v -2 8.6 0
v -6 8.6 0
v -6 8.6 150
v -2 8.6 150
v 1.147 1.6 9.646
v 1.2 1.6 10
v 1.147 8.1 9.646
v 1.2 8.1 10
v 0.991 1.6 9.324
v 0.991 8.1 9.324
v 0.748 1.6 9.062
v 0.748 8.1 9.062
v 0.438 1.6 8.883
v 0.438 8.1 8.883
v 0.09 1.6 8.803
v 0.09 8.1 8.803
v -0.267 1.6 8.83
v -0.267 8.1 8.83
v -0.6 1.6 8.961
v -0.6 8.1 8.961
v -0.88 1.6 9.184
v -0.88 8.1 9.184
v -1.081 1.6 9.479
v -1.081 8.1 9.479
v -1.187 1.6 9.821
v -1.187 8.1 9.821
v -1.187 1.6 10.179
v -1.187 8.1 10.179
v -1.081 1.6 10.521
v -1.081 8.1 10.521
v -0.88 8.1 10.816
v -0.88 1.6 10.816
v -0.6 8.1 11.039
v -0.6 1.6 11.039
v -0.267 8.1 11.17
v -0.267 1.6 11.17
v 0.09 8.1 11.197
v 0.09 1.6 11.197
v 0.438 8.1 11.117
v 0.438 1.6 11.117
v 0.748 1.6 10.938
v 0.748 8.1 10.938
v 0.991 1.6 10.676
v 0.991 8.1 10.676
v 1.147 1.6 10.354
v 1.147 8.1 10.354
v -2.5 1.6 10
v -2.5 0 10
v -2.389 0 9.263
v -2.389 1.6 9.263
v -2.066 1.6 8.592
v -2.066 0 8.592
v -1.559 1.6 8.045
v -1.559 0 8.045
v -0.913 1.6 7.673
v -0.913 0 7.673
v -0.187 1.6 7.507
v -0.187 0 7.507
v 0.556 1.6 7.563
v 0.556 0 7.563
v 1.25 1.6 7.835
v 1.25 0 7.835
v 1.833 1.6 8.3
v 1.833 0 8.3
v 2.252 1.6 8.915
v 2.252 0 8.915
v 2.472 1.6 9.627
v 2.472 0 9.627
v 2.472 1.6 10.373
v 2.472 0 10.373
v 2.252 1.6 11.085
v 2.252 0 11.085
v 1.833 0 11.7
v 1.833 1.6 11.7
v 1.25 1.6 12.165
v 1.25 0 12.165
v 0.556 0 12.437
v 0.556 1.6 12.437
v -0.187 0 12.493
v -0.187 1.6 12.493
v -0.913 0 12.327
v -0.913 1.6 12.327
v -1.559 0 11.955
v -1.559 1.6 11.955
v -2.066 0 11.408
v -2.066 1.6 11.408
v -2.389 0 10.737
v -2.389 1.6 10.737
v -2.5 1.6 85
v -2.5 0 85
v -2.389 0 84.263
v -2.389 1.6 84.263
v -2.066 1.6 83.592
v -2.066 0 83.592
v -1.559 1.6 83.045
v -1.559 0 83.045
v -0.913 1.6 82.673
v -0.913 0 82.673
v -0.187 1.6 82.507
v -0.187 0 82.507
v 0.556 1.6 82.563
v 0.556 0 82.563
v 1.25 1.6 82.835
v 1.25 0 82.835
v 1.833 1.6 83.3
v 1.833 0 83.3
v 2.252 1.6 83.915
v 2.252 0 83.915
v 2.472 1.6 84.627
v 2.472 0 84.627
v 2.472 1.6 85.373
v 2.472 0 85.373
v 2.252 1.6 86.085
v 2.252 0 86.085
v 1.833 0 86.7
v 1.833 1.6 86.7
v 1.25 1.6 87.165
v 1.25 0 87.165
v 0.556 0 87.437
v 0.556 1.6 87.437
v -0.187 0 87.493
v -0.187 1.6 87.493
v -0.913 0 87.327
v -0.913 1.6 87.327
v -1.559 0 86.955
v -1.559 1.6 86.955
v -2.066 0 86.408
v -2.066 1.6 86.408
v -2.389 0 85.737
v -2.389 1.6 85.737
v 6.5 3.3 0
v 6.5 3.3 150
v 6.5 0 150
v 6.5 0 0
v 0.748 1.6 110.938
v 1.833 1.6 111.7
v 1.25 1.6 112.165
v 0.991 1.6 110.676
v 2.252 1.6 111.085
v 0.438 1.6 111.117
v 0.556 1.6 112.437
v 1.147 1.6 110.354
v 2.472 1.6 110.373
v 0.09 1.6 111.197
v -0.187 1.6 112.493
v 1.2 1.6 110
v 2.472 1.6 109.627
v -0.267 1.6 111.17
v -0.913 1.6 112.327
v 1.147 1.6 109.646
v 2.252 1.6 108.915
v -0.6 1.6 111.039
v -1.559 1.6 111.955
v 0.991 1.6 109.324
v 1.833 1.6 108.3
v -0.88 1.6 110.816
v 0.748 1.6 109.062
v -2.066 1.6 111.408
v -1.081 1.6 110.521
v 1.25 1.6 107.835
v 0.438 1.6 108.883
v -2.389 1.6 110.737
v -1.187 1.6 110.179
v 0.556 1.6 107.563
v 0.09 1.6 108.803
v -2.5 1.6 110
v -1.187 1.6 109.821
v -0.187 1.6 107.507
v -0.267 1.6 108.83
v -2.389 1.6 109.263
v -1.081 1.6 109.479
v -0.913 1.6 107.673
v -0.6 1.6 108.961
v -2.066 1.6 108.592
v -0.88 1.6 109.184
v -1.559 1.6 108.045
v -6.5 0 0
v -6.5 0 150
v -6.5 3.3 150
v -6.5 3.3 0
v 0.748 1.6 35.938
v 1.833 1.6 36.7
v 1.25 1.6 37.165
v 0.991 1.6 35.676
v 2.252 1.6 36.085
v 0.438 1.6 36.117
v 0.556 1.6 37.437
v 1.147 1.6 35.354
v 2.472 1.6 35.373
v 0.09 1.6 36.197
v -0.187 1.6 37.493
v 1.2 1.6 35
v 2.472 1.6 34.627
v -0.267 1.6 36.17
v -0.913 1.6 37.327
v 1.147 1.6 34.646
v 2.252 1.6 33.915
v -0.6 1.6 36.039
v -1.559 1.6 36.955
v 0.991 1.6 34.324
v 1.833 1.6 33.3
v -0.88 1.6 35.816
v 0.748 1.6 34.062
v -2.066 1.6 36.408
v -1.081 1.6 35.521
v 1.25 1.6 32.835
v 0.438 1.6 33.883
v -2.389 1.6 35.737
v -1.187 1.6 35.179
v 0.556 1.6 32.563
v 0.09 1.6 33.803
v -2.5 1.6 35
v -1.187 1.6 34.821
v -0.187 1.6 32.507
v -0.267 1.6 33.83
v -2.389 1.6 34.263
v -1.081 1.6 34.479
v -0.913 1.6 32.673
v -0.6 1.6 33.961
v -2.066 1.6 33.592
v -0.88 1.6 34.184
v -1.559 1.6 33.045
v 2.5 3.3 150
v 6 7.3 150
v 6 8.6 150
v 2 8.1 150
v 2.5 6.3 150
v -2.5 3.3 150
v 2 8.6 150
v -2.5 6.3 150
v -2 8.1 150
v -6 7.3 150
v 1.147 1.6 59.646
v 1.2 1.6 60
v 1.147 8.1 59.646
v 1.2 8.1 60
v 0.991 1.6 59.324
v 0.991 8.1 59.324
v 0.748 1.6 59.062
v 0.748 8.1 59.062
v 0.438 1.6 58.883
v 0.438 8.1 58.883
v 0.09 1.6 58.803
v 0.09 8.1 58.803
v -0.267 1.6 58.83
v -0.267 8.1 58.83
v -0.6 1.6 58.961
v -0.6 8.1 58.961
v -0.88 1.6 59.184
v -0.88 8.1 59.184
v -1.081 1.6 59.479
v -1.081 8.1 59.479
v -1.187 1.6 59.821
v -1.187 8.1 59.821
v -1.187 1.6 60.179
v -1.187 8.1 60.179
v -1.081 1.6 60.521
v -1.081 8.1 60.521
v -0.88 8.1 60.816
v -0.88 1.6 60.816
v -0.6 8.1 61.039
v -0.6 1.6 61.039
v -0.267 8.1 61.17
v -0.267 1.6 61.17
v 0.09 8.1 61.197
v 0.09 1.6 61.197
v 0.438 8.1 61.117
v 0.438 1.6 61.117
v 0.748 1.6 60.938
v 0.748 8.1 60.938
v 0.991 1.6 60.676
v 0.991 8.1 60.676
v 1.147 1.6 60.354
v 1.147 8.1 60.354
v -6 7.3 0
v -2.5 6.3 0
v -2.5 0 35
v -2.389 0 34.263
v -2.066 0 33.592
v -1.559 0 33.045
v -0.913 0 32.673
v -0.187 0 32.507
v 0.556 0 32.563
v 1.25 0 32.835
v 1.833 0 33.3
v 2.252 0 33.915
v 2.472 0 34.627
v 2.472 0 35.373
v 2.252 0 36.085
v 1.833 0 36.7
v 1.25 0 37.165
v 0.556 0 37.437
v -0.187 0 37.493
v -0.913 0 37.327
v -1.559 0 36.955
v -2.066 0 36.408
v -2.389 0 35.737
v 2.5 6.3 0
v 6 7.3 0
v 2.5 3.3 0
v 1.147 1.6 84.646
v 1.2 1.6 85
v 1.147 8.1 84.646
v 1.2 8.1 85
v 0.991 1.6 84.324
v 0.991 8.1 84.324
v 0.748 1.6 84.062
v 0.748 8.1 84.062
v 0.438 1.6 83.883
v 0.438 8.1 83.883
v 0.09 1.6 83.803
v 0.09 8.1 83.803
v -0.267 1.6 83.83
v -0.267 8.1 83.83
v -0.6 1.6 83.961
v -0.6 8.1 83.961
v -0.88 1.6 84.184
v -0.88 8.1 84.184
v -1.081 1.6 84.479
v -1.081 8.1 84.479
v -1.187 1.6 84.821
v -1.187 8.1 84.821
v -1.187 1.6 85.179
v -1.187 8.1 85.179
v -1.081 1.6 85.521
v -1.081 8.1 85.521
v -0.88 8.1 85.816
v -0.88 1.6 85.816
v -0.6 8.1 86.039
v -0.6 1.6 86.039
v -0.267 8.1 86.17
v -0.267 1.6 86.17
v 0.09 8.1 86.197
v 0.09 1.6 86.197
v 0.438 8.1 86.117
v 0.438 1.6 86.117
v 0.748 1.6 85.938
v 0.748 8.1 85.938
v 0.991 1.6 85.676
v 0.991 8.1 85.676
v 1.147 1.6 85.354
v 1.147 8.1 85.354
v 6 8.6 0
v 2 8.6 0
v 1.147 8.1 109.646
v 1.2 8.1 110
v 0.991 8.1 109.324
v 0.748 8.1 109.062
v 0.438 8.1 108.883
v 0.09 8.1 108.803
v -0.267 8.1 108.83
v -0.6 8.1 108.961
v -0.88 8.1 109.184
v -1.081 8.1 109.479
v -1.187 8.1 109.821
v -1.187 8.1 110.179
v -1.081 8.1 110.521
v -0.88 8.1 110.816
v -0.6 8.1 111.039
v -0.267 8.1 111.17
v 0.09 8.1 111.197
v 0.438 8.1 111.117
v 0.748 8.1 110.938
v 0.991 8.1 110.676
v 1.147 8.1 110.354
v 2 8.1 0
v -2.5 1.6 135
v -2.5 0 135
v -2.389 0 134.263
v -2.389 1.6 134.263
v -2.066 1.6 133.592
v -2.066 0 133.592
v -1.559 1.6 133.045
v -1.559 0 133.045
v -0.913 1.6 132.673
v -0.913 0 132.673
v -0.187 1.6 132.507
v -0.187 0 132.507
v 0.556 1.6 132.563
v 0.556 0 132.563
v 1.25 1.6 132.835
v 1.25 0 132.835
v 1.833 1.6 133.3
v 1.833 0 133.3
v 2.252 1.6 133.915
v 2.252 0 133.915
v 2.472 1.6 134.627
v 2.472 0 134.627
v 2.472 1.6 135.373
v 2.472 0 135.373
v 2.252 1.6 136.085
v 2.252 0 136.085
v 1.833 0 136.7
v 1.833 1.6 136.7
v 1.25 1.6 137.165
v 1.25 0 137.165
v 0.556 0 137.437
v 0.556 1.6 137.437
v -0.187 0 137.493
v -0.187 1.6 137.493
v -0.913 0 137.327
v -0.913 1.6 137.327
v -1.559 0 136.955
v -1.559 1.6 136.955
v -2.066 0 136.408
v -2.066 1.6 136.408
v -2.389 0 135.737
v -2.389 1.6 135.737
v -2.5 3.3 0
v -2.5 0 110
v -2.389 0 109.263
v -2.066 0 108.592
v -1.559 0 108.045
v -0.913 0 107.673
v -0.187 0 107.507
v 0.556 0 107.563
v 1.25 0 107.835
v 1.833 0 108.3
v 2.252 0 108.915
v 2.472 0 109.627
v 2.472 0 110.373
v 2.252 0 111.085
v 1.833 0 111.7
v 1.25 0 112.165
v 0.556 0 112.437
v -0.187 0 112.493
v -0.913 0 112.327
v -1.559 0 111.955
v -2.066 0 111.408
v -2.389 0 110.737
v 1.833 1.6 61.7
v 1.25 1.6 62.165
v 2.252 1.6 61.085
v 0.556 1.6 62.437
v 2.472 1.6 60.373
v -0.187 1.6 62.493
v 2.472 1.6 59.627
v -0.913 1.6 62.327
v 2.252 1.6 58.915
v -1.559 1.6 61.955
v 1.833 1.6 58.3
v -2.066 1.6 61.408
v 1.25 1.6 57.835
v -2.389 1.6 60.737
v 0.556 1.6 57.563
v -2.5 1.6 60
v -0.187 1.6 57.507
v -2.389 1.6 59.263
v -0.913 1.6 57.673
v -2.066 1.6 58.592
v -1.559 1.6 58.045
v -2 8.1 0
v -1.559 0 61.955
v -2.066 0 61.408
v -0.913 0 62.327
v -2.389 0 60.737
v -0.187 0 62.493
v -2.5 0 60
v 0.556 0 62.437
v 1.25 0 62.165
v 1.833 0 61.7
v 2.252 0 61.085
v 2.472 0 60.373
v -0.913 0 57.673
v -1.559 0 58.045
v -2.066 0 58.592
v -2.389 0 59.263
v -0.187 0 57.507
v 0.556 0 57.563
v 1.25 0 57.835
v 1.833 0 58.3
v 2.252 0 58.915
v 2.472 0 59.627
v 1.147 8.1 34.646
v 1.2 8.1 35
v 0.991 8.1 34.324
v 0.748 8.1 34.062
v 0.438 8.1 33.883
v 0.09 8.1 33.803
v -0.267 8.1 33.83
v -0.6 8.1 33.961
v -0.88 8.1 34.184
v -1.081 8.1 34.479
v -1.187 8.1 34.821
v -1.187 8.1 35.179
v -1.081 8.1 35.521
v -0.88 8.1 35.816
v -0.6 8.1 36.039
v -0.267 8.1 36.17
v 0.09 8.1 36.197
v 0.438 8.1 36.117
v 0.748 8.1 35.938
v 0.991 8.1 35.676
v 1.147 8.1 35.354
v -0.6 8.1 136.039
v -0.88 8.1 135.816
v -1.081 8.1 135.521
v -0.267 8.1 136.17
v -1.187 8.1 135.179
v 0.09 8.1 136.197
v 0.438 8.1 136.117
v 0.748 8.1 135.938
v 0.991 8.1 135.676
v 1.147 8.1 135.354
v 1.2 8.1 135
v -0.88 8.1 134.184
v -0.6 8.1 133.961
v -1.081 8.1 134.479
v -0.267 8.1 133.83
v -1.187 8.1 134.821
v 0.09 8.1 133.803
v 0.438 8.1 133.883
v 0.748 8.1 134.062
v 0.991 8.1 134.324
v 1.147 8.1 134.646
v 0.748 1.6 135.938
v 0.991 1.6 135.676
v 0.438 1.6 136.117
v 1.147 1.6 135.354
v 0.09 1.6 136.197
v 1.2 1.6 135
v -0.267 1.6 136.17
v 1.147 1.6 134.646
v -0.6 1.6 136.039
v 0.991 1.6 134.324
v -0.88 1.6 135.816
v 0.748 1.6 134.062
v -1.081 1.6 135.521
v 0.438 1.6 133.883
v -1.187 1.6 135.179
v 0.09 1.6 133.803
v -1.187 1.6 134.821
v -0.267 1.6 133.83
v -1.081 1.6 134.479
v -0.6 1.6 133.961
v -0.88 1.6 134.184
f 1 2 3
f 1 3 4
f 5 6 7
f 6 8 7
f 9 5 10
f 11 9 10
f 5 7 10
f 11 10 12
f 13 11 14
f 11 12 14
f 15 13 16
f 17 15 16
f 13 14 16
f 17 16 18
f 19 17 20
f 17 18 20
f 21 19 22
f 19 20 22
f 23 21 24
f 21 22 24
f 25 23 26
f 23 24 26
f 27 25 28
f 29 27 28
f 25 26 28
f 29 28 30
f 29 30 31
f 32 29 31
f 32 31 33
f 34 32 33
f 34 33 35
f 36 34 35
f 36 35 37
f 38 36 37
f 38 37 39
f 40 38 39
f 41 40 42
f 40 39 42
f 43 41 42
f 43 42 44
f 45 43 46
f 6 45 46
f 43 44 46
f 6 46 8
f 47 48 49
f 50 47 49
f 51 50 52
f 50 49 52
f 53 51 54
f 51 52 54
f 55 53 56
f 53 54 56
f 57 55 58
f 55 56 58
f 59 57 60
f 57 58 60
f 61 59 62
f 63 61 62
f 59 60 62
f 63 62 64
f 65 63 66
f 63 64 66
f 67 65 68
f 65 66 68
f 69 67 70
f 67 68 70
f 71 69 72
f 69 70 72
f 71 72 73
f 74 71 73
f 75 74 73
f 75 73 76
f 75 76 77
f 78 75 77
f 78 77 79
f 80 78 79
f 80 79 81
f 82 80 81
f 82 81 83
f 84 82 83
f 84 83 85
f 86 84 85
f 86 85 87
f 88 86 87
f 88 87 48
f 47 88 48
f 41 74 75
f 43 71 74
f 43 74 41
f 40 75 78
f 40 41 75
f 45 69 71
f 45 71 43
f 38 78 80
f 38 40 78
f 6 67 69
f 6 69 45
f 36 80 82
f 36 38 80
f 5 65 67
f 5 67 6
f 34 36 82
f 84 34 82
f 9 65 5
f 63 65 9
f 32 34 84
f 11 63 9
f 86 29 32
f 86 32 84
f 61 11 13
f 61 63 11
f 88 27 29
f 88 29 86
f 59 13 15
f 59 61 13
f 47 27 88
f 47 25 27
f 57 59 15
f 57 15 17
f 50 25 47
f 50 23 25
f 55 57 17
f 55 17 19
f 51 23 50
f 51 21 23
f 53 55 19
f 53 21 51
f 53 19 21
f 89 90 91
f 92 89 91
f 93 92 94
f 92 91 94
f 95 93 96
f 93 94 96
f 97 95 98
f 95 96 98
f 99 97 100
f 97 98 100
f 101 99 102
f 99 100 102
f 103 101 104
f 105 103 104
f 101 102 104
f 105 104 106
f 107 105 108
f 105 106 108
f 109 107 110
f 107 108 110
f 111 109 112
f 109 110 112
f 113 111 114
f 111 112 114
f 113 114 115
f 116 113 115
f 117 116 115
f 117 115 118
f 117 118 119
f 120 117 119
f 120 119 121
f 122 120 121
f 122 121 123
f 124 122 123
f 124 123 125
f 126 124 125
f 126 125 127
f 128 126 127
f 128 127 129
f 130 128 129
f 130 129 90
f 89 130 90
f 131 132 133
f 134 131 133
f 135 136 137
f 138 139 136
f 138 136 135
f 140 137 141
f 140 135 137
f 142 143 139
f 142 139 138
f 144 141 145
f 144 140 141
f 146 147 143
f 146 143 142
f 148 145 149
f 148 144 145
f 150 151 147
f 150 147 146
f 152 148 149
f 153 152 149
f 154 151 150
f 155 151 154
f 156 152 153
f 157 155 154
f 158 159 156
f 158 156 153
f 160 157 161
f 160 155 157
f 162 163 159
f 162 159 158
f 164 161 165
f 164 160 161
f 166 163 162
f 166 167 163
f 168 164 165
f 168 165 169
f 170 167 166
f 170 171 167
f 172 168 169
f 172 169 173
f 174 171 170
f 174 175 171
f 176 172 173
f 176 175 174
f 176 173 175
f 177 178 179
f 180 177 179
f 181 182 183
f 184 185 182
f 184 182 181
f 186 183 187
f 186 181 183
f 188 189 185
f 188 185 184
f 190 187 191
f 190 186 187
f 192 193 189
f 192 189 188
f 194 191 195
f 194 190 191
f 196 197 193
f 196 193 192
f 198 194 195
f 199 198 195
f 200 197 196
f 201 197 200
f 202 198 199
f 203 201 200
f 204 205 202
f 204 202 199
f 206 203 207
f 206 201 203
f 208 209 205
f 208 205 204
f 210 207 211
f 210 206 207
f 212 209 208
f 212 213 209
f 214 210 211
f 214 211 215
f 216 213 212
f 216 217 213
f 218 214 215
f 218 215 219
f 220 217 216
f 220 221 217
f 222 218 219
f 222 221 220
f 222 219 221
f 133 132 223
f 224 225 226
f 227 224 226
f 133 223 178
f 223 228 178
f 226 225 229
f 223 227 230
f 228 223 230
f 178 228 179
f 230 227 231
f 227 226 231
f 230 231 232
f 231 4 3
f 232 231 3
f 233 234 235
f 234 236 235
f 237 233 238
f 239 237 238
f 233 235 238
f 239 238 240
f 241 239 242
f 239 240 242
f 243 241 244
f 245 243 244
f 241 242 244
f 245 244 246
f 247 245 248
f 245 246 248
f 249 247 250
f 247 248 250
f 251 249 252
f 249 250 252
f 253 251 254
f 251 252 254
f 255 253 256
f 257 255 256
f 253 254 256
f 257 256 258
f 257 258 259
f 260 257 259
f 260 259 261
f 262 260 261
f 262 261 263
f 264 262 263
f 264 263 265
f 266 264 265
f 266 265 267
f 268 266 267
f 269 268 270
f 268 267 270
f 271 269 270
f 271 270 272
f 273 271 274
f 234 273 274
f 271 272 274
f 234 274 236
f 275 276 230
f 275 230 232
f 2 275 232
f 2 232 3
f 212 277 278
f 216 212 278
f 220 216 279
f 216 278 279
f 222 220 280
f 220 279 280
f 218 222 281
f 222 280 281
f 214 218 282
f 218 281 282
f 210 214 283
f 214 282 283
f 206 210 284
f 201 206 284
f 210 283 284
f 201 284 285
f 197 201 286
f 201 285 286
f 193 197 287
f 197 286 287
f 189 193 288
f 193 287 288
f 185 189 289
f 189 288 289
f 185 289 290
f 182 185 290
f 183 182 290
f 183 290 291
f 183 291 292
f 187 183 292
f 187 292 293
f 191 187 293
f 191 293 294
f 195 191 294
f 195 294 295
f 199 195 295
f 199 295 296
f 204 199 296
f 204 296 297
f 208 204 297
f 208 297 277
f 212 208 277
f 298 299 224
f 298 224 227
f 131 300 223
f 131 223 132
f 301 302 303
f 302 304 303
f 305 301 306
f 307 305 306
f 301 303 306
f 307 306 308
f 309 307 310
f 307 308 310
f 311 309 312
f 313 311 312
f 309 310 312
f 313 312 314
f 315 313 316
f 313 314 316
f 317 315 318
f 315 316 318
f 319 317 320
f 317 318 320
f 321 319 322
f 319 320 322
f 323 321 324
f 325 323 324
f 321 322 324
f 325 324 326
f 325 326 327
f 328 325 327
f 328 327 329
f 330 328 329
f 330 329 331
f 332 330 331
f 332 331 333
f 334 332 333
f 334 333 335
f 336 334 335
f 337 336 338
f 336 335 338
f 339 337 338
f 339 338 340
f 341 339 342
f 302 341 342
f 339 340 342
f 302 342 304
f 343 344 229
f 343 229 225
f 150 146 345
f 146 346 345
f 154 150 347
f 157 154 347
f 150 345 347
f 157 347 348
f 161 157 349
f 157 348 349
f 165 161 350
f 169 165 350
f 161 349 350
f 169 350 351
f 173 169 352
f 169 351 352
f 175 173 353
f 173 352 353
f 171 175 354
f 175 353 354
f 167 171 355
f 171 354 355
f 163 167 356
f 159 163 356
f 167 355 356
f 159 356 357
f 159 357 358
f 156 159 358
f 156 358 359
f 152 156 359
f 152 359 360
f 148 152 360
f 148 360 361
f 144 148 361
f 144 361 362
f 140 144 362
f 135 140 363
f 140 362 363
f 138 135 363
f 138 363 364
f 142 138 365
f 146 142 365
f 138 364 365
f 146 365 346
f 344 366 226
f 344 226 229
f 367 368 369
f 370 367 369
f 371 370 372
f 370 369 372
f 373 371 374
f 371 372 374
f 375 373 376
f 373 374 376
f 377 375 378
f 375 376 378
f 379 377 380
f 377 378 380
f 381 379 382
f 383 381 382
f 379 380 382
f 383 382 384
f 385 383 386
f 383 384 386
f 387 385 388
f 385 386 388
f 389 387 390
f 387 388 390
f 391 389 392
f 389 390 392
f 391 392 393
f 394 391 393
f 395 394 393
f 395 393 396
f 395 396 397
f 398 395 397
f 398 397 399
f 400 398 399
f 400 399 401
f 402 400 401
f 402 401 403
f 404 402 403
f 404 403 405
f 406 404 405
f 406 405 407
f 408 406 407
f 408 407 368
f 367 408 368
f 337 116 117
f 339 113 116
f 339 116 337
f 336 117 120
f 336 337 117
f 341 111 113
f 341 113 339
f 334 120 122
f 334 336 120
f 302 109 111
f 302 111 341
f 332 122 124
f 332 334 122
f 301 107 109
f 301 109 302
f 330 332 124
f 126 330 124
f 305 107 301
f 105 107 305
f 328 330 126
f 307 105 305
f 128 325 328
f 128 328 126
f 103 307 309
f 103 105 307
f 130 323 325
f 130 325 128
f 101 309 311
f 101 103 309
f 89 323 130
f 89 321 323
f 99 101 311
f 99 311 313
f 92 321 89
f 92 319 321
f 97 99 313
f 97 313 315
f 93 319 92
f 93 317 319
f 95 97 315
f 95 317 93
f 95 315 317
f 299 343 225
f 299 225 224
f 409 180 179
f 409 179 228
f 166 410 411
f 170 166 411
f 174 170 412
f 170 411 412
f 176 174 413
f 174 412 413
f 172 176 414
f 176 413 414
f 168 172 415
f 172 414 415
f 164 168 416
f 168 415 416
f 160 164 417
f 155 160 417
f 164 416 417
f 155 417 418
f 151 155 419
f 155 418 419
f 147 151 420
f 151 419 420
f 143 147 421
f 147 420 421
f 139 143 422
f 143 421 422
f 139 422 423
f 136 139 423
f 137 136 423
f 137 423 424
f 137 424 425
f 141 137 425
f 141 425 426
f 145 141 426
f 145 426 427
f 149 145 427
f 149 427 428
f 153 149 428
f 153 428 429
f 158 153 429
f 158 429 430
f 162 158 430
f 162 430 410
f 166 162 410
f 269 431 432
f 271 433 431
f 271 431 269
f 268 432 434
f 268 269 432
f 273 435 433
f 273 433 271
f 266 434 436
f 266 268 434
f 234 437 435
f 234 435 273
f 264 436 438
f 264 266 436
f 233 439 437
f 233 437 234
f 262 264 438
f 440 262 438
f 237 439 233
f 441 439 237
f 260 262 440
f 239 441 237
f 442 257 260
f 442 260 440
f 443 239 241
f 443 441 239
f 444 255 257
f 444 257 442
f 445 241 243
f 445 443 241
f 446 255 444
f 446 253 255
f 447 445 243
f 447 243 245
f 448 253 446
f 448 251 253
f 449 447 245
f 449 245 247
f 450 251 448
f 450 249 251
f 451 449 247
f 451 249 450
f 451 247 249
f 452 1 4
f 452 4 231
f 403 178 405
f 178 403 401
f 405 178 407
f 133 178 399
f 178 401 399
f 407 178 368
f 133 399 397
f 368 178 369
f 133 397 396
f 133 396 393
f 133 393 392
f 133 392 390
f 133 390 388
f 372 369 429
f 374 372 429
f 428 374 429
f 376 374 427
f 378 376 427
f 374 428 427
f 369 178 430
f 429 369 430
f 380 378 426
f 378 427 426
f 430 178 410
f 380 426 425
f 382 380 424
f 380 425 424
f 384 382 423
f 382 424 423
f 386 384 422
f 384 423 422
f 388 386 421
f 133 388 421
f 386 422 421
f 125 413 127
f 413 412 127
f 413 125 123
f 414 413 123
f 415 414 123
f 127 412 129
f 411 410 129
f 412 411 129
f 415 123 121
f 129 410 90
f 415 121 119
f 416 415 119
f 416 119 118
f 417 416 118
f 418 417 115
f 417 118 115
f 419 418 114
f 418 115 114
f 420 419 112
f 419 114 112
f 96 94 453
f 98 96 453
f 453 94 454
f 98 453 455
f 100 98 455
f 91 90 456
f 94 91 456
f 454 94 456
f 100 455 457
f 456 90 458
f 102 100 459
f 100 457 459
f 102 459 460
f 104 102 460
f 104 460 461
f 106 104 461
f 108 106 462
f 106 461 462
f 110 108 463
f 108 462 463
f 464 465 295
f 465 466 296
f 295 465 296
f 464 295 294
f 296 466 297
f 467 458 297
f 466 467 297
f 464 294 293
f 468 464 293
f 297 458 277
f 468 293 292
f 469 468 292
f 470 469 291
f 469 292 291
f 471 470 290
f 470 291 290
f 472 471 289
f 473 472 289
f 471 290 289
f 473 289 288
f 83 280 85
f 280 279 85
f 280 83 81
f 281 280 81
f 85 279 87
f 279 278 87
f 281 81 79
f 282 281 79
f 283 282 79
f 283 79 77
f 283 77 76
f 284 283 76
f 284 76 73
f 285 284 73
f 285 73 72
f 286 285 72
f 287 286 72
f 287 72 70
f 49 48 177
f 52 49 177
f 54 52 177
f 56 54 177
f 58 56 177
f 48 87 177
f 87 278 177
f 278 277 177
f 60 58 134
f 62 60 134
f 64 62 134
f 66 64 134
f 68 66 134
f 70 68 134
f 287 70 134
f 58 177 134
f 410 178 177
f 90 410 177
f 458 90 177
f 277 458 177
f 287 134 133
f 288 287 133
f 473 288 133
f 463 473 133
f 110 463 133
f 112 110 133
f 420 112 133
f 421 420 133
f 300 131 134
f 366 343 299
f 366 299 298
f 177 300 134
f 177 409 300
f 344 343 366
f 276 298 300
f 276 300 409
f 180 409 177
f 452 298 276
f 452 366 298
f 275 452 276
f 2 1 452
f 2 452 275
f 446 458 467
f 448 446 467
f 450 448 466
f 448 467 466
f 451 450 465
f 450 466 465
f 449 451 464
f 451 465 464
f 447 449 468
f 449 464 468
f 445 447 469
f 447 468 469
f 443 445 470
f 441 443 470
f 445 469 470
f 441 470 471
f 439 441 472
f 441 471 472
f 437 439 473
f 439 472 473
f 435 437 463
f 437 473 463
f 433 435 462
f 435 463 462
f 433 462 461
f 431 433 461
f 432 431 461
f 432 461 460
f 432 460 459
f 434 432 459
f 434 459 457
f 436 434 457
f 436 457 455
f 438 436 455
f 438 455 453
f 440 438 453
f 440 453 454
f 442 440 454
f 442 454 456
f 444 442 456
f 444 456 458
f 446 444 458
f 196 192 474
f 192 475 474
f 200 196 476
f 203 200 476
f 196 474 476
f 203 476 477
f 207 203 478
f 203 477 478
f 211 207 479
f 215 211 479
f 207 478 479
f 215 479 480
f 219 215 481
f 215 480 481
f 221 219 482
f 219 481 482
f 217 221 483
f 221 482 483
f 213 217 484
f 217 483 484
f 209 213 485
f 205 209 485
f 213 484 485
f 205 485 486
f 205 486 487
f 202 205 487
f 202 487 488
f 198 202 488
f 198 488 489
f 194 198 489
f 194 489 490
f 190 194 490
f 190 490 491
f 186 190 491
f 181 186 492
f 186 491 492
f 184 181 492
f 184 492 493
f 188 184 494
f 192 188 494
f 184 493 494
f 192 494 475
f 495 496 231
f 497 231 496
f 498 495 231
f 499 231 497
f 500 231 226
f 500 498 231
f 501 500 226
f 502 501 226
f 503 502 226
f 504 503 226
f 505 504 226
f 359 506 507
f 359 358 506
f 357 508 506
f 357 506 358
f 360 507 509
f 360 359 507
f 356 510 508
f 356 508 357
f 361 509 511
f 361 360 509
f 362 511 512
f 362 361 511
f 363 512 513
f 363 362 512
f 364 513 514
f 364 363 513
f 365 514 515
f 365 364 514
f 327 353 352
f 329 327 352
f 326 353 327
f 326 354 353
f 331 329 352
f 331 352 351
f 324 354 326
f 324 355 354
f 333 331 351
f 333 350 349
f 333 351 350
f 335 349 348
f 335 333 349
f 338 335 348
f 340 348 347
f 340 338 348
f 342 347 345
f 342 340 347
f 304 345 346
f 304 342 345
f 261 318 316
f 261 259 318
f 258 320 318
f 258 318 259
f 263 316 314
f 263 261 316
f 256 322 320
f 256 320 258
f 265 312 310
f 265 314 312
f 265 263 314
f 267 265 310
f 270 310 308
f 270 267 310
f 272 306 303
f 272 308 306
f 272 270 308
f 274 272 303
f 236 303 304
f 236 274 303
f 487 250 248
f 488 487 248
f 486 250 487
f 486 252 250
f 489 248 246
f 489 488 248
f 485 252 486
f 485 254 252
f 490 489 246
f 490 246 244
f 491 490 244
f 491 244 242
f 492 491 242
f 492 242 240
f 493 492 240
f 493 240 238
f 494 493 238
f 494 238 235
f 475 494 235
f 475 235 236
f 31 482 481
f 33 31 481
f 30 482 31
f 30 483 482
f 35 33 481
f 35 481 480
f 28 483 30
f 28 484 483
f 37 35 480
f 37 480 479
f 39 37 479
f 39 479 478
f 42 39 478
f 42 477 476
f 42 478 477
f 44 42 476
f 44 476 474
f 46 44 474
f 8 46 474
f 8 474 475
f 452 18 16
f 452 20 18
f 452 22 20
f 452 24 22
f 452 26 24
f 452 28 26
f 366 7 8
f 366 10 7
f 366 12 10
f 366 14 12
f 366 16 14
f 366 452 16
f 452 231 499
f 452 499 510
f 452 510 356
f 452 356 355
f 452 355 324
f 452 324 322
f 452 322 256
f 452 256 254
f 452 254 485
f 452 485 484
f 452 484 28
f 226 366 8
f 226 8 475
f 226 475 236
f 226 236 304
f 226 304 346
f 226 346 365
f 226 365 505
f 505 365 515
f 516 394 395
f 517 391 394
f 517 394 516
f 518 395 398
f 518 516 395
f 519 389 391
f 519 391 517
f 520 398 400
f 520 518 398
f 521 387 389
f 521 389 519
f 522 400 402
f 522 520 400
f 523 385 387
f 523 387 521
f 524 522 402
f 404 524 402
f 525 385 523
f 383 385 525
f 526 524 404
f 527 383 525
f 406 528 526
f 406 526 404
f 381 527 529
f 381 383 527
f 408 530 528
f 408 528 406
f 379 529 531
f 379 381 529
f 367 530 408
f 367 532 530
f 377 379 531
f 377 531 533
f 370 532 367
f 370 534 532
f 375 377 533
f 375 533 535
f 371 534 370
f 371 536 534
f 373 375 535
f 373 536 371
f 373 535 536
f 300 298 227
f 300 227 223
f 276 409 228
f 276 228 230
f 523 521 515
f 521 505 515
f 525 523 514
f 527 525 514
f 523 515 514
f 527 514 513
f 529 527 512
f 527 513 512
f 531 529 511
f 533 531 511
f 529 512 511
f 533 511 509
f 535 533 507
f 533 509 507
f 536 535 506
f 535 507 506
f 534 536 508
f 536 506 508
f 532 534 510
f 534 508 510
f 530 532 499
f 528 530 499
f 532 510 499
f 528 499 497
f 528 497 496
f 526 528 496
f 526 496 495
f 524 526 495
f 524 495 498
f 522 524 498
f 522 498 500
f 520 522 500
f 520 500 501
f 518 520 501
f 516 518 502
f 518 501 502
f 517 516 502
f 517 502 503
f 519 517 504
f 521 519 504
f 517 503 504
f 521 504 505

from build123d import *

# Parameters (mm, degrees)
AUFSATZ_LINEAR_AUSTRAGEN1_DEPTH                      = 150
STIRNSENKUNG_F_R_M2_FLACHKOPFSCHRAUBE_MI_D           = 2.4
STIRNSENKUNG_F_R_M2_FLACHKOPFSCHRAUBE_MI_CBORE_D     = 5
STIRNSENKUNG_F_R_M2_FLACHKOPFSCHRAUBE_MI_CBORE_DEPTH = 1.6


with BuildPart() as part:
    # Skizze1 → Aufsatz-Linear austragen1 (new body)
    with BuildSketch(Plane.XY):
        Polygon((0, 0), (-6.5, 0), (-6.5, 3.3), (-2.5, 3.3), (-2.5, 6.3), (-6, 7.3), (-6, 8.6), (-2, 8.6), (-2, 8.1), (2, 8.1), (2, 8.6), (6, 8.6), (6, 7.3), (2.5, 6.3), (2.5, 3.3), (6.5, 3.3), (6.5, 0), align=None)
    extrude(amount=AUFSATZ_LINEAR_AUSTRAGEN1_DEPTH)

    # Stirnsenkung für M2 Flachkopfschraube mit Schlitz1 (through all)
    with Locations(Plane(origin=(0, 0, 0), x_dir=(-1, 0, 0), z_dir=(0, -1, 0))):
        with Locations((0, -85), (0, -60), (0, -35), (0, -10), (0, -110), (0, -135)):
            CounterBoreHole(STIRNSENKUNG_F_R_M2_FLACHKOPFSCHRAUBE_MI_D / 2, STIRNSENKUNG_F_R_M2_FLACHKOPFSCHRAUBE_MI_CBORE_D / 2, STIRNSENKUNG_F_R_M2_FLACHKOPFSCHRAUBE_MI_CBORE_DEPTH)


solid = part.part
